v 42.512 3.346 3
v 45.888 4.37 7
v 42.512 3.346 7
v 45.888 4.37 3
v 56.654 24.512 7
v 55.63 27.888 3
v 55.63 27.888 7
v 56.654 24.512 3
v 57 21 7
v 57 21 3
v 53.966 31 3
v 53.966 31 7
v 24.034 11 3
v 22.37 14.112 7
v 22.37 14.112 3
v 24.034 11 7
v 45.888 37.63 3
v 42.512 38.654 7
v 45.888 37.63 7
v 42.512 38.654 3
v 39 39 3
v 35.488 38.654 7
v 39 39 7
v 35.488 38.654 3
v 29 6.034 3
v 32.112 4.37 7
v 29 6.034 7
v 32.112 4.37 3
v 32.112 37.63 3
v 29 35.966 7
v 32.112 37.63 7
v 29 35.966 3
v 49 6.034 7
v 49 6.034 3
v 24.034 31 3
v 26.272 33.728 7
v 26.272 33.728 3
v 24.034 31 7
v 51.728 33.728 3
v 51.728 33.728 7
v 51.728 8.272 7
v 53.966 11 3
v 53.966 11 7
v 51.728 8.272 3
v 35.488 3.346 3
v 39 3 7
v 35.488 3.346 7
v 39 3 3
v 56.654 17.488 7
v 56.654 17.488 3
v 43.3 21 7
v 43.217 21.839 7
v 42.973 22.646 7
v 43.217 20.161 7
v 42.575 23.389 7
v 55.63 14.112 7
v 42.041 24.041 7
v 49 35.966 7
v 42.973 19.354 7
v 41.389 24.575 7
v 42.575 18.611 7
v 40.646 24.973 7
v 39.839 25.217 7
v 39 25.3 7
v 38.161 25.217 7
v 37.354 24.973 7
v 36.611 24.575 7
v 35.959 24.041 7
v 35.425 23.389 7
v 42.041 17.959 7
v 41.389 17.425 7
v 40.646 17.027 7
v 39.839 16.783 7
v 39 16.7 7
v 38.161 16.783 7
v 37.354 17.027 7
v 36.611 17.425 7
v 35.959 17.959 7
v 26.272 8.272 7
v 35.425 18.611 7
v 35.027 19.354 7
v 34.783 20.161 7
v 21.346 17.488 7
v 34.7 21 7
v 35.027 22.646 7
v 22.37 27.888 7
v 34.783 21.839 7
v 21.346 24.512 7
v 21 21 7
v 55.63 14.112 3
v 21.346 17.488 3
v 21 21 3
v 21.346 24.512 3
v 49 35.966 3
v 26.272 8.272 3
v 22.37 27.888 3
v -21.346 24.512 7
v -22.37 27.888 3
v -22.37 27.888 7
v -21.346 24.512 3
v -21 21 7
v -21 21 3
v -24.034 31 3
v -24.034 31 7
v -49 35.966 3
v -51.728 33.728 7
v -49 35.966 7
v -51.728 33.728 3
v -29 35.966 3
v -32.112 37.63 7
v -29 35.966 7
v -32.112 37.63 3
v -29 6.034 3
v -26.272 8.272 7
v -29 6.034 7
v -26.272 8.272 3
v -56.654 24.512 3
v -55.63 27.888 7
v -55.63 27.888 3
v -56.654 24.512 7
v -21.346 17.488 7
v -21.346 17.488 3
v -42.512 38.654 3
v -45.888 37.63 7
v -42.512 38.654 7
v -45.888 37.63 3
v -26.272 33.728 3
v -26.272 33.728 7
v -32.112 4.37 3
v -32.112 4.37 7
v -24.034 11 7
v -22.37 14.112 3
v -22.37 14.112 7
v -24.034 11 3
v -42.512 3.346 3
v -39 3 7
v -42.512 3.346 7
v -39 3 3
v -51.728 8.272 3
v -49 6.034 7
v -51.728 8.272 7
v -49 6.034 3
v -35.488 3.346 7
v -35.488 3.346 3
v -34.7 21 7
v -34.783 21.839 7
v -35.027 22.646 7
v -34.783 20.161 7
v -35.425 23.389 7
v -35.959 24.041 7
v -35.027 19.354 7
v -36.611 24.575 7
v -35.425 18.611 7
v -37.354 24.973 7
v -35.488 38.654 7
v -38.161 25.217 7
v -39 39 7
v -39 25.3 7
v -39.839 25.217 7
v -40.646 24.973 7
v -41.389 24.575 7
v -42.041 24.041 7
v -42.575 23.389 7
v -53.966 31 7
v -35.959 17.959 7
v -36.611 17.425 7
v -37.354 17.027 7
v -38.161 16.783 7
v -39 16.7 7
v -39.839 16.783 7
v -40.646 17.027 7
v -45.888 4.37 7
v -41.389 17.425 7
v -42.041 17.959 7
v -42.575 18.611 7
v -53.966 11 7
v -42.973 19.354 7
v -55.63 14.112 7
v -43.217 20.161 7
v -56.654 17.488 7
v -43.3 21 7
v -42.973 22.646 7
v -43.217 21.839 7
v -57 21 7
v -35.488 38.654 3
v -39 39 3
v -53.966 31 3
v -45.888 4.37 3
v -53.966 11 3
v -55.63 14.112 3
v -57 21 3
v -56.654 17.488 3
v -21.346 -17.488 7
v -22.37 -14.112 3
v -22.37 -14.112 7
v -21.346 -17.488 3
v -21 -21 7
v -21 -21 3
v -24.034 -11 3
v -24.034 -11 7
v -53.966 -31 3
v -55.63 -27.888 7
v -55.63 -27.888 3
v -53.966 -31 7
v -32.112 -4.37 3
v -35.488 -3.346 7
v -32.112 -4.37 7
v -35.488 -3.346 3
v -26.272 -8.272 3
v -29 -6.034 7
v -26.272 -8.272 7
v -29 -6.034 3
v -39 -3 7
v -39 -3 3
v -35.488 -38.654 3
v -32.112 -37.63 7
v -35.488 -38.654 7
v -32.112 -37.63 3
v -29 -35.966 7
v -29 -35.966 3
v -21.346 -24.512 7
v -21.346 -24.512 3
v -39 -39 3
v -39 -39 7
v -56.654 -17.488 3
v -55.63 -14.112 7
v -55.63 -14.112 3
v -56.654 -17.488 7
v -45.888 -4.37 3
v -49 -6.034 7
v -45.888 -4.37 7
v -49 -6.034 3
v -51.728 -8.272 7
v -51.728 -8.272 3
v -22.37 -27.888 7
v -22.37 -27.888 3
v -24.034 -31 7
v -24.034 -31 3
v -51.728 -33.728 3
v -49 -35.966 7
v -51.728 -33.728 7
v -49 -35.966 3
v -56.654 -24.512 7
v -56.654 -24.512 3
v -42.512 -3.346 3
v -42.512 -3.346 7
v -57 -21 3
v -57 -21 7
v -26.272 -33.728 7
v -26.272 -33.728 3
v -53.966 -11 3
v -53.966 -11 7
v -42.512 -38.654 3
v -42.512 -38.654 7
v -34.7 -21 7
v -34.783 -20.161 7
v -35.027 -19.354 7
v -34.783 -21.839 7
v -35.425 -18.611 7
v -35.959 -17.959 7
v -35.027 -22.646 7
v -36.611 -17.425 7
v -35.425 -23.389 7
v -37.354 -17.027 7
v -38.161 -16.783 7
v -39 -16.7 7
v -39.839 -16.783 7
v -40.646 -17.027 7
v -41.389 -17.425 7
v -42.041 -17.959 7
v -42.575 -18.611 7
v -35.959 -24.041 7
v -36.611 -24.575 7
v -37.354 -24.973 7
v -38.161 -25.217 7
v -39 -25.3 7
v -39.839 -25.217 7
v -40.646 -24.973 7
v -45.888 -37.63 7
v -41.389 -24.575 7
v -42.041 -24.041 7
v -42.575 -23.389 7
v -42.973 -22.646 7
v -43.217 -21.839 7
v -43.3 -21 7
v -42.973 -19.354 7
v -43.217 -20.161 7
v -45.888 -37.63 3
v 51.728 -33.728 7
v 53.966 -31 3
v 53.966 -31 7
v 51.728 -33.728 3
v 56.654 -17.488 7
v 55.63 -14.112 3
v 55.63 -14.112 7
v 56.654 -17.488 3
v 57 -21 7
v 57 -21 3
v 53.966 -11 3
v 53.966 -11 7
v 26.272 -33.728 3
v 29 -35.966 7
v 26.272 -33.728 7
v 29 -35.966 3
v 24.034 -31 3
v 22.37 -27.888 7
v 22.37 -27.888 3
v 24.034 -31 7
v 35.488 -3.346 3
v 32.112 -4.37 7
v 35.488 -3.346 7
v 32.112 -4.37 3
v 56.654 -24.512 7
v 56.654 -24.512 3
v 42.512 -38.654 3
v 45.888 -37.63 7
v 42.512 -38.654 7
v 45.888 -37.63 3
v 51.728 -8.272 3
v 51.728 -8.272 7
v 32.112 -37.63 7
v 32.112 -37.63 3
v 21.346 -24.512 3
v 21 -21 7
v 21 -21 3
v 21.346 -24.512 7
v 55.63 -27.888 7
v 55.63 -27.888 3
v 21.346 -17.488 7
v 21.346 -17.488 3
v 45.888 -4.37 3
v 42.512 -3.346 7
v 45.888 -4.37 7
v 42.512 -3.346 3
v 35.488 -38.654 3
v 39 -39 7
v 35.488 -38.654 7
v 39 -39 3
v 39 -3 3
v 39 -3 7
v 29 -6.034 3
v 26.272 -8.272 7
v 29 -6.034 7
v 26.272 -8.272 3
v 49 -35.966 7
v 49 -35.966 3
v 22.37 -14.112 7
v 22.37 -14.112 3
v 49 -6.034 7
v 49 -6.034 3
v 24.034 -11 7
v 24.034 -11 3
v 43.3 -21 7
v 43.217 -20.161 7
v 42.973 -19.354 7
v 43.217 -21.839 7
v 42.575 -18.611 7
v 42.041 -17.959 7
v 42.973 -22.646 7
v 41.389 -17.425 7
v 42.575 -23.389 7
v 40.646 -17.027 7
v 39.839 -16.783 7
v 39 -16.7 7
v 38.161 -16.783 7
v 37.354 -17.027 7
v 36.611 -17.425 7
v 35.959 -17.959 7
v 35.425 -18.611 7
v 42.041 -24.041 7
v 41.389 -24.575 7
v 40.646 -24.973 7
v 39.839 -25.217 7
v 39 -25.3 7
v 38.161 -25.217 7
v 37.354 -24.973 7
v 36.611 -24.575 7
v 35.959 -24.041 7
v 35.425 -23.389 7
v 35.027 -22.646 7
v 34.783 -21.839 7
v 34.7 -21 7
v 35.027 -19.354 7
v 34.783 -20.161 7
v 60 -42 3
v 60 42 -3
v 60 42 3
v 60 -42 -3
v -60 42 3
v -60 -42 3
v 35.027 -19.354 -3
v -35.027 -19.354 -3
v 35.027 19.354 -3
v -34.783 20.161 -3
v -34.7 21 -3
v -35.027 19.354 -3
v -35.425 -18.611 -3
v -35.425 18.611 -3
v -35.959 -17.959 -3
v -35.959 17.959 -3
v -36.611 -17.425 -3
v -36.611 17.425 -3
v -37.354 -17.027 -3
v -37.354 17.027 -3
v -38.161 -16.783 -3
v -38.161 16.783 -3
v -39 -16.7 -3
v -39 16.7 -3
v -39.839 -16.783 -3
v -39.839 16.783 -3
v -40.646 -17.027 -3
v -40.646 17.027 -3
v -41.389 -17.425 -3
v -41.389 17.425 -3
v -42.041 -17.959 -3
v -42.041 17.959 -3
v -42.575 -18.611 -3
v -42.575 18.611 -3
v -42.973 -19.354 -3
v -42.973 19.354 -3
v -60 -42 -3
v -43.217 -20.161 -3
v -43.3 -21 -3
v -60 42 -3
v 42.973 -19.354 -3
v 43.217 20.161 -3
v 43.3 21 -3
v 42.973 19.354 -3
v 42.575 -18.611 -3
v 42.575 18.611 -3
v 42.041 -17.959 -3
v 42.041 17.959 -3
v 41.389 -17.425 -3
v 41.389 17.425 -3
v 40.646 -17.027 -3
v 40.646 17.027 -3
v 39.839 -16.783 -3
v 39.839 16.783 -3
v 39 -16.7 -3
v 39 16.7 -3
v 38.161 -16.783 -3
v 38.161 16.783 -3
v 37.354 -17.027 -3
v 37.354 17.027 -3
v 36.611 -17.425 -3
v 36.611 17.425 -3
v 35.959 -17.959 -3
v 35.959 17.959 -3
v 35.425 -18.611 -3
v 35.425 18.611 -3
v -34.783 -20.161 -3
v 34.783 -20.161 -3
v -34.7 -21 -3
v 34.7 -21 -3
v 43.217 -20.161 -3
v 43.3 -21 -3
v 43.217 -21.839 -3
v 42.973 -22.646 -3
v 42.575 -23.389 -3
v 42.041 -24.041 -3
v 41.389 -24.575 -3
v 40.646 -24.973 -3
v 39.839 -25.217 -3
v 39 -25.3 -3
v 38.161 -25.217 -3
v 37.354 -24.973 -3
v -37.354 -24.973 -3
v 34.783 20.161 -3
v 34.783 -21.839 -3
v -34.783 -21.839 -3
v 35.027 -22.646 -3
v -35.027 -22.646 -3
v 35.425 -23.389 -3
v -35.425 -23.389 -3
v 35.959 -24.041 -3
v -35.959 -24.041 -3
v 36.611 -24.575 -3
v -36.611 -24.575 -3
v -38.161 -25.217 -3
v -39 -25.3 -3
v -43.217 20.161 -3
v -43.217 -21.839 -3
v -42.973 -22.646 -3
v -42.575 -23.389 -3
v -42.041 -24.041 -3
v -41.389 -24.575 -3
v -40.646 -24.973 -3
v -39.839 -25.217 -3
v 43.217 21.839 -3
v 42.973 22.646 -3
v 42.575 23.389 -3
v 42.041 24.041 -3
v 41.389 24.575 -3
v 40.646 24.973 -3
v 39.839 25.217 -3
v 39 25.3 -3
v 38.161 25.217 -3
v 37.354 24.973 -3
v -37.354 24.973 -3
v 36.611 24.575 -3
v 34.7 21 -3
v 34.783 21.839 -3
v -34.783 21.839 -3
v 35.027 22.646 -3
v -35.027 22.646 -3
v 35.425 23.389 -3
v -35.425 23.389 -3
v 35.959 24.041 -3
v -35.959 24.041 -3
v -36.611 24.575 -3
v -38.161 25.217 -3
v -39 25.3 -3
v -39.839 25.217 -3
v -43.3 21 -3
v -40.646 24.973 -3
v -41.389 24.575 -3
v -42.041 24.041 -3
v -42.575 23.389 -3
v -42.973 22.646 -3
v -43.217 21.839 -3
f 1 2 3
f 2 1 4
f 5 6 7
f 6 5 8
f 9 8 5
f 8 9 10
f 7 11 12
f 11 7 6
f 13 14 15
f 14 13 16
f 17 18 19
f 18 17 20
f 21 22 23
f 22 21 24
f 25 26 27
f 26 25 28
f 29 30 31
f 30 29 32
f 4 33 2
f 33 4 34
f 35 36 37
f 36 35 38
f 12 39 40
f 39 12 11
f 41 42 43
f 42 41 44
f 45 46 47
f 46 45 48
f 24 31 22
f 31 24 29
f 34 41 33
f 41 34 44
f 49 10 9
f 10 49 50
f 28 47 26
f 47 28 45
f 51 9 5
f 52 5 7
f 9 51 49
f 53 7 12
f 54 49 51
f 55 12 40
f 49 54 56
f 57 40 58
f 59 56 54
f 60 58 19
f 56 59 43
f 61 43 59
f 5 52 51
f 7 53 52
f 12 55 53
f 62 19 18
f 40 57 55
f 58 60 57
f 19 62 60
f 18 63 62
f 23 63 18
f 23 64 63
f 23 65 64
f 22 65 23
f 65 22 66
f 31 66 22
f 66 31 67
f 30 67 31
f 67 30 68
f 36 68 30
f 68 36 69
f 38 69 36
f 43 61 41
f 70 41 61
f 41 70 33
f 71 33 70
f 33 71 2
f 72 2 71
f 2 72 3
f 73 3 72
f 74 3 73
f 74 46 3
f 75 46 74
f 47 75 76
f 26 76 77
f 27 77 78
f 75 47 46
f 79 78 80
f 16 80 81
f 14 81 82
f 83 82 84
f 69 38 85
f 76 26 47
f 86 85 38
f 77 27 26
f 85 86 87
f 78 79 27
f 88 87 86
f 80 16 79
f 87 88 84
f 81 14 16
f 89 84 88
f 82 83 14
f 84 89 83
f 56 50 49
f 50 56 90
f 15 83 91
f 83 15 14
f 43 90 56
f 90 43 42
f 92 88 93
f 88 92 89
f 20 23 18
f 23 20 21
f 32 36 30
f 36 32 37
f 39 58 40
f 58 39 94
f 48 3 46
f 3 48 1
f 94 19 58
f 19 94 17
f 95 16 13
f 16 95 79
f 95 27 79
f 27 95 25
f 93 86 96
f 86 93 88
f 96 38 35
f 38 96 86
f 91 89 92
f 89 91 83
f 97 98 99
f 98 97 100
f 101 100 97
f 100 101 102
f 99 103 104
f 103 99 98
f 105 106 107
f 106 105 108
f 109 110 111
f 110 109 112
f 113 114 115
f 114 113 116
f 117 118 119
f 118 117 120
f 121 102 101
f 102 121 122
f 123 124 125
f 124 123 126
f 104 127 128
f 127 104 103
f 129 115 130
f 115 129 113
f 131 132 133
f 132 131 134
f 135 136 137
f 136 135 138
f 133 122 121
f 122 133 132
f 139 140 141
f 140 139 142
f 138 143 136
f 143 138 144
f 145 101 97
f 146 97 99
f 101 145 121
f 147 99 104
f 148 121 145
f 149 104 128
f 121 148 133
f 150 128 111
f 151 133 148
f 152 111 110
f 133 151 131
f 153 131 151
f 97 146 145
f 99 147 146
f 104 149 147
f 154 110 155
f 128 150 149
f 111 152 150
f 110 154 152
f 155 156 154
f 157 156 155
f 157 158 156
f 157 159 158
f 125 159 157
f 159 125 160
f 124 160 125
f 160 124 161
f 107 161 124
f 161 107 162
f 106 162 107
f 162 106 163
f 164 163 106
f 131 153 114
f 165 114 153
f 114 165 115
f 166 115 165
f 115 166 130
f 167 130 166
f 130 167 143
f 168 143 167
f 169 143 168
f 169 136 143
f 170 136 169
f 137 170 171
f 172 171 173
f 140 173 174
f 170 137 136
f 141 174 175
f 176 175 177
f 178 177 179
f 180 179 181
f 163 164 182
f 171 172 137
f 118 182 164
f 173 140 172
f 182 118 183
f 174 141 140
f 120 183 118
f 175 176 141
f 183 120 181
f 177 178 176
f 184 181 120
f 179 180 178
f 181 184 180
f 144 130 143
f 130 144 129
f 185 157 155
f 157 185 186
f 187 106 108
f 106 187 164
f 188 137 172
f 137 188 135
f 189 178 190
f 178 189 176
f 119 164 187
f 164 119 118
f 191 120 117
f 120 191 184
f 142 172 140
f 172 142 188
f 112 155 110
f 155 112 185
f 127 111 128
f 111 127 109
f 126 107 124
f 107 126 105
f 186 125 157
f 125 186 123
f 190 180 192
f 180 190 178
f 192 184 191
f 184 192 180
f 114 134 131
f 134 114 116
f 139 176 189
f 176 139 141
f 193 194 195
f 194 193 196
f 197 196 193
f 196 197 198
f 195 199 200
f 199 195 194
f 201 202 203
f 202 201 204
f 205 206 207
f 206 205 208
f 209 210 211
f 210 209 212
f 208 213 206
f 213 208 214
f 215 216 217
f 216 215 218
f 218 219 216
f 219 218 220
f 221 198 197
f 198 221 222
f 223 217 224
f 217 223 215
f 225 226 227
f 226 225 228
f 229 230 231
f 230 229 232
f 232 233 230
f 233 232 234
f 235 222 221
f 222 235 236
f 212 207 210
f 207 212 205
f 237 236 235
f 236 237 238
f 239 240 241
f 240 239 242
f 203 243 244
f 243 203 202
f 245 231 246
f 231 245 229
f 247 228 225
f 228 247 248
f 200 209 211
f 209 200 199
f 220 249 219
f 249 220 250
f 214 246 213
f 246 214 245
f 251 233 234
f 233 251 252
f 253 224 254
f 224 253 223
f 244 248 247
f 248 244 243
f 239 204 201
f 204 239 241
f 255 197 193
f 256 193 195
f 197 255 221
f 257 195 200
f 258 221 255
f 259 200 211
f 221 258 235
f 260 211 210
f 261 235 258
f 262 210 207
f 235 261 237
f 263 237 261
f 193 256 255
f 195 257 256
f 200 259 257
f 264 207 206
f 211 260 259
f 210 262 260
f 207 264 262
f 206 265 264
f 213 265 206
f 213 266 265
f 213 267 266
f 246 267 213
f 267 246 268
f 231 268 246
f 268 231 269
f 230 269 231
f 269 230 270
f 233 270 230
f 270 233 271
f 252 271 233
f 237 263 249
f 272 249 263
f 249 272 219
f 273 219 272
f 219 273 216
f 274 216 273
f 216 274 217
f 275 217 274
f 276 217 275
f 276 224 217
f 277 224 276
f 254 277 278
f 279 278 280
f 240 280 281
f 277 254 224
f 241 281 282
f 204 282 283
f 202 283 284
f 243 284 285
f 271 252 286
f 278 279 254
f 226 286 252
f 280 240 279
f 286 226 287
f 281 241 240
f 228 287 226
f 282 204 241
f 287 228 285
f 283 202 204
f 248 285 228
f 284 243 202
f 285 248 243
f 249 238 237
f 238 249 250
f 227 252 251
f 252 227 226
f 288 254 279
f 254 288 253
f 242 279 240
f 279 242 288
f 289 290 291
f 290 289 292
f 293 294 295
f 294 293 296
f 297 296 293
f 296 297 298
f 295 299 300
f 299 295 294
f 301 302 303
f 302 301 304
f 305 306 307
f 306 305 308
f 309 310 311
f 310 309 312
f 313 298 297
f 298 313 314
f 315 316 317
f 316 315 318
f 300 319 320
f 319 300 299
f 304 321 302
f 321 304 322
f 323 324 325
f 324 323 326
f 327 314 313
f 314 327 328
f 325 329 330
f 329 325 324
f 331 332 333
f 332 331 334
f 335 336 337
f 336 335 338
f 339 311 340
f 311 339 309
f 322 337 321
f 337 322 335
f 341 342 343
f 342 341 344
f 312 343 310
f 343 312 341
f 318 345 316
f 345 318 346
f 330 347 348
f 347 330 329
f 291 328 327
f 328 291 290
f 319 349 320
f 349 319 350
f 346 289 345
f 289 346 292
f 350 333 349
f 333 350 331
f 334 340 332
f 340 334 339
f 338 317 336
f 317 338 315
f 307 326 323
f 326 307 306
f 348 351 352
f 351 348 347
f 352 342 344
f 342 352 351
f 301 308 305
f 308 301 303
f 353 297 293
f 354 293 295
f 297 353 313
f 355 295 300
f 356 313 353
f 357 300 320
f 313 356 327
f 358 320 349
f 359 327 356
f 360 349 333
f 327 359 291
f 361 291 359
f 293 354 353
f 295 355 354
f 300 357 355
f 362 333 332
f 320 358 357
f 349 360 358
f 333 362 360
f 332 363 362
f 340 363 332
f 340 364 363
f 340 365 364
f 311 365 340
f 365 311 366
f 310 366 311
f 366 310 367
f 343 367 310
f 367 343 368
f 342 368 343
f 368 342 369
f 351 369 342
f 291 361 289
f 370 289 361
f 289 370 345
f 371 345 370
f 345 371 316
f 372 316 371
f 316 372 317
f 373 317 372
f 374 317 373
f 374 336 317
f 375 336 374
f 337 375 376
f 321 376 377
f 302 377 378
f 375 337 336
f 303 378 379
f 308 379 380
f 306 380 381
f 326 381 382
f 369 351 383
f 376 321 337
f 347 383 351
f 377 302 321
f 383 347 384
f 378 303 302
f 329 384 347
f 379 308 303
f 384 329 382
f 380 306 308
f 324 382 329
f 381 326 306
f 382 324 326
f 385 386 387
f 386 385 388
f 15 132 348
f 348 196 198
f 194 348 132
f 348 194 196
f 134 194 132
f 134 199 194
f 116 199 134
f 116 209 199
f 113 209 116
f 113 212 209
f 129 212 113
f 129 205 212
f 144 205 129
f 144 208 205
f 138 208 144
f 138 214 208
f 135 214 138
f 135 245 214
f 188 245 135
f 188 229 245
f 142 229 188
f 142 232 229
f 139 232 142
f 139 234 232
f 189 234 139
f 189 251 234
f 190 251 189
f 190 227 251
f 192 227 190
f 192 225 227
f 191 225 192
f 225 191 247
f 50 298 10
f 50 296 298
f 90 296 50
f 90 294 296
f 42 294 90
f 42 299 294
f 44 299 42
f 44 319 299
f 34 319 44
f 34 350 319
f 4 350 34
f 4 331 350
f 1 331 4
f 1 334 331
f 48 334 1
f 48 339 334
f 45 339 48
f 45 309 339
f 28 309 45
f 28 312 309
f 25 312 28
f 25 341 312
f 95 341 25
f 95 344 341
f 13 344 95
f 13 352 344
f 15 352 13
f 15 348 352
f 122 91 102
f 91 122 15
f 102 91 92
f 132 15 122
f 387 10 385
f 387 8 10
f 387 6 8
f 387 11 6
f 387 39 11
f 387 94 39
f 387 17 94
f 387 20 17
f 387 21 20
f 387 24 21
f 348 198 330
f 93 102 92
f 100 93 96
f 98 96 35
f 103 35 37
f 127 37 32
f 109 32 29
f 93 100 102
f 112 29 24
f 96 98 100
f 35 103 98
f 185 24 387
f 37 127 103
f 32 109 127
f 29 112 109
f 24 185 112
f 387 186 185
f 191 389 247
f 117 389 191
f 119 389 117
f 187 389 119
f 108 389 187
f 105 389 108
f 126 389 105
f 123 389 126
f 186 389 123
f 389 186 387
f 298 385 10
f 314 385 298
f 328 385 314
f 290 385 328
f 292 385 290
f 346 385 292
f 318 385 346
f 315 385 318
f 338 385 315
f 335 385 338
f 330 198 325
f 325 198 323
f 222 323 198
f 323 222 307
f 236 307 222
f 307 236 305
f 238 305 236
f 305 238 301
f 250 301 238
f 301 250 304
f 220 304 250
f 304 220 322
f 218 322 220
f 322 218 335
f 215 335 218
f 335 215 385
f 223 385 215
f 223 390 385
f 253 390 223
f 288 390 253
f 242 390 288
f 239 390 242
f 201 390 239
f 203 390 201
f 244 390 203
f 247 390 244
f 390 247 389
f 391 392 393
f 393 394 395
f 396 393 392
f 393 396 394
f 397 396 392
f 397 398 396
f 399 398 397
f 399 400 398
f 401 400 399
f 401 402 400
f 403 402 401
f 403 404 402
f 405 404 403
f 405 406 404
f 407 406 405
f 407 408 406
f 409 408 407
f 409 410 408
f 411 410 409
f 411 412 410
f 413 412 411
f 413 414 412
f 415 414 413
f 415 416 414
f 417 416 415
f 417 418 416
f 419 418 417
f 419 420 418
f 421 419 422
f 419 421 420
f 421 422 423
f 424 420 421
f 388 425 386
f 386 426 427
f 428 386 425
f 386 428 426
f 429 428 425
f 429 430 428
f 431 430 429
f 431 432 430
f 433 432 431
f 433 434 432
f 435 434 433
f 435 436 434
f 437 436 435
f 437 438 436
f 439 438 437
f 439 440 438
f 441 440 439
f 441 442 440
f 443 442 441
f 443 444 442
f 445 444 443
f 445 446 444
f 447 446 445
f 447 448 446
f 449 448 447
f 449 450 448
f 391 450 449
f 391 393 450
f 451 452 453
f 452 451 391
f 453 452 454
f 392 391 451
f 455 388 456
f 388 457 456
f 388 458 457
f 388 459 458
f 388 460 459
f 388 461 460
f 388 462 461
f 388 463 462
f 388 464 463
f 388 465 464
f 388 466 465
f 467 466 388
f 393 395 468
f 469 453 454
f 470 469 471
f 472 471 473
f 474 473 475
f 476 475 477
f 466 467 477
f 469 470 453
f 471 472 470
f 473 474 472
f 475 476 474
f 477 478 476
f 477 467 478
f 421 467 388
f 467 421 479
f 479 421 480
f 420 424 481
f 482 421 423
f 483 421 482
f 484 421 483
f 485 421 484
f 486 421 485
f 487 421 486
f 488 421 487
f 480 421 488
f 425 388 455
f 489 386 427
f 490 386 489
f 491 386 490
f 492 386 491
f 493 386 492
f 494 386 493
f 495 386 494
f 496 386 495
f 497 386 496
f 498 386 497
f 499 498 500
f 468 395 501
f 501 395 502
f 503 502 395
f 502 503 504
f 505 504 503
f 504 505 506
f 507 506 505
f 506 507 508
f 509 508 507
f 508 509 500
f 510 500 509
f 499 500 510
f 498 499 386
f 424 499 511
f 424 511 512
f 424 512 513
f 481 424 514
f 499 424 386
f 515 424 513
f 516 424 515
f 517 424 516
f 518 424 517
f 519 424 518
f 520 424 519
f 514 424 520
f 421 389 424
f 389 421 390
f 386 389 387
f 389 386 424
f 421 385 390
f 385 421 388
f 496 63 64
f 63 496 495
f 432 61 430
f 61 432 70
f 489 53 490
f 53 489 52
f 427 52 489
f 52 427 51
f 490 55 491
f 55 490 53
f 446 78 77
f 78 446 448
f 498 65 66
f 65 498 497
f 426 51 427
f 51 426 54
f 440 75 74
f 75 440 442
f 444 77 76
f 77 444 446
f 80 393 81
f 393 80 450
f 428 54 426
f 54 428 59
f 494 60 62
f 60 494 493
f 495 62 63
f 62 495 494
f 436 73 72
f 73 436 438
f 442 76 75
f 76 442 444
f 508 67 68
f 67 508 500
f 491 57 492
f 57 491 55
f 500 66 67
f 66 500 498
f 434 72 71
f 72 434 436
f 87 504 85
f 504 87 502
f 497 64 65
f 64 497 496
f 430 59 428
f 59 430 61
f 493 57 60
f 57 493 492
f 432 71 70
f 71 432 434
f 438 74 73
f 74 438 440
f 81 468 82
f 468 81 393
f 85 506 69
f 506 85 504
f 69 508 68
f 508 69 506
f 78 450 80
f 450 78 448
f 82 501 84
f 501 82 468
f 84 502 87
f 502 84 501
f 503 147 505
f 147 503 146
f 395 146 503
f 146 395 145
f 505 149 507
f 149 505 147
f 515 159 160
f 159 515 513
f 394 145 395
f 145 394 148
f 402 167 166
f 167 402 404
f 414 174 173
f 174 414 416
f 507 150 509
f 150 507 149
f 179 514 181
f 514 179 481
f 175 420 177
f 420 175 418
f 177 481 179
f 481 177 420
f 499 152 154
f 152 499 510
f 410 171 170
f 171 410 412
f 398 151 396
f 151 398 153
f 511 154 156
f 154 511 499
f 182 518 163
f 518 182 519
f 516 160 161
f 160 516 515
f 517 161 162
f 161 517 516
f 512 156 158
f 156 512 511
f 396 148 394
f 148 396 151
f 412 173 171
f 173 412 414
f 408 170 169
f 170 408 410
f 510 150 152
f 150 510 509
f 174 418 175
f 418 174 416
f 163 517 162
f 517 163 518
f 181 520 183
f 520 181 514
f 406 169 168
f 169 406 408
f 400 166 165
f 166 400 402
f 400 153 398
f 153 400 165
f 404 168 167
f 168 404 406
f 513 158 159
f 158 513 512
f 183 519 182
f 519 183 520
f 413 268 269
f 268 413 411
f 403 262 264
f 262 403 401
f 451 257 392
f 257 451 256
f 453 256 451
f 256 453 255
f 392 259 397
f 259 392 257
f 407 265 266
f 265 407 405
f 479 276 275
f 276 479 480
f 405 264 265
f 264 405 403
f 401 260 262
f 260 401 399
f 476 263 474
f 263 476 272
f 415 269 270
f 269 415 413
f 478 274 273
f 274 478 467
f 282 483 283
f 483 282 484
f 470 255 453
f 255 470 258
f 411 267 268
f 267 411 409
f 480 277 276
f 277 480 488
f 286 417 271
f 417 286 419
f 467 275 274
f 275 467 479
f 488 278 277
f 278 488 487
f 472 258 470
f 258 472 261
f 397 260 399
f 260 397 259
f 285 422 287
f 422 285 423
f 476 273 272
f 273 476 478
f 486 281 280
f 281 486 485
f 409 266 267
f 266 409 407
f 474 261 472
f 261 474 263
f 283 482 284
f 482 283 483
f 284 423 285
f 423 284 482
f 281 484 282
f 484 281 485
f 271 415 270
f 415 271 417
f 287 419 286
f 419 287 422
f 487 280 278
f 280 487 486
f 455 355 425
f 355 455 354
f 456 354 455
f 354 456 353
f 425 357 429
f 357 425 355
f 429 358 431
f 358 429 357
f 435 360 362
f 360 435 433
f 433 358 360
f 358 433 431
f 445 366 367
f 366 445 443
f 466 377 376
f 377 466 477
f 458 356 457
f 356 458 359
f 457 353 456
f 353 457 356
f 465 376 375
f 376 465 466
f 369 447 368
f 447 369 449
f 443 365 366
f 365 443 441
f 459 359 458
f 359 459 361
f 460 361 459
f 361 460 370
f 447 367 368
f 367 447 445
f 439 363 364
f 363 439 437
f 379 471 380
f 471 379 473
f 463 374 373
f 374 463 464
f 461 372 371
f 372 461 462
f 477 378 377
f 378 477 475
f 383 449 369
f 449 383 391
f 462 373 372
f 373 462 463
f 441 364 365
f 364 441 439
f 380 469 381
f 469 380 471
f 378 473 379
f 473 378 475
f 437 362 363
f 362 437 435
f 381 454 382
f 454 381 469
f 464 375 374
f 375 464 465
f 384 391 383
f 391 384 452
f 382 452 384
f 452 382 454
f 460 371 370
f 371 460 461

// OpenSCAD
$fn = 32;

// ----------------------------------------------------------------------
// Anchor pads 120 x 84 x 10
// four corner bosses with anchor holes
// ----------------------------------------------------------------------

// --- parameters (mm) ---
plate = [120, 84, 6];   // base plate size (x, y, z)
pads = 4;               // boss count, one per corner
edge = 21;              // boss centre offset from the plate edge
boss_d = 36;            // boss diameter
boss_h = 4;             // boss height above the base plate
bore_d = 8.4;           // nominal hole diameter from the drawing
print_allowance = 0.2;  // clearance added for printing

// --- derived feature positions (mm) ---
hole_d = bore_d + print_allowance;  // = 8.6   hole diameter as printed
height = plate[2] + boss_h;         // = 10   overall height of the part
corner_x = plate[0] / 2 - edge;     // = 39   boss centre X
corner_y = plate[1] / 2 - edge;     // = 21   boss centre Y
feature_centers = [
  [corner_x, corner_y],
  [-corner_x, corner_y],
  [-corner_x, -corner_y],
  [corner_x, -corner_y]
];   // boss centres, anchor holes are drilled there

// base plate, four bosses standing on it, anchor holes all the way through
difference() {
  union() {
    cube(plate, center = true);
    for (centre = feature_centers)
      translate([centre[0], centre[1], plate[2] / 2 - 1])
        cylinder(d = boss_d, h = boss_h + 1);
  }
  for (centre = feature_centers)
    translate([centre[0], centre[1], -height])
      cylinder(d = hole_d, h = 2 * height + 2);  // through boss and plate
}
